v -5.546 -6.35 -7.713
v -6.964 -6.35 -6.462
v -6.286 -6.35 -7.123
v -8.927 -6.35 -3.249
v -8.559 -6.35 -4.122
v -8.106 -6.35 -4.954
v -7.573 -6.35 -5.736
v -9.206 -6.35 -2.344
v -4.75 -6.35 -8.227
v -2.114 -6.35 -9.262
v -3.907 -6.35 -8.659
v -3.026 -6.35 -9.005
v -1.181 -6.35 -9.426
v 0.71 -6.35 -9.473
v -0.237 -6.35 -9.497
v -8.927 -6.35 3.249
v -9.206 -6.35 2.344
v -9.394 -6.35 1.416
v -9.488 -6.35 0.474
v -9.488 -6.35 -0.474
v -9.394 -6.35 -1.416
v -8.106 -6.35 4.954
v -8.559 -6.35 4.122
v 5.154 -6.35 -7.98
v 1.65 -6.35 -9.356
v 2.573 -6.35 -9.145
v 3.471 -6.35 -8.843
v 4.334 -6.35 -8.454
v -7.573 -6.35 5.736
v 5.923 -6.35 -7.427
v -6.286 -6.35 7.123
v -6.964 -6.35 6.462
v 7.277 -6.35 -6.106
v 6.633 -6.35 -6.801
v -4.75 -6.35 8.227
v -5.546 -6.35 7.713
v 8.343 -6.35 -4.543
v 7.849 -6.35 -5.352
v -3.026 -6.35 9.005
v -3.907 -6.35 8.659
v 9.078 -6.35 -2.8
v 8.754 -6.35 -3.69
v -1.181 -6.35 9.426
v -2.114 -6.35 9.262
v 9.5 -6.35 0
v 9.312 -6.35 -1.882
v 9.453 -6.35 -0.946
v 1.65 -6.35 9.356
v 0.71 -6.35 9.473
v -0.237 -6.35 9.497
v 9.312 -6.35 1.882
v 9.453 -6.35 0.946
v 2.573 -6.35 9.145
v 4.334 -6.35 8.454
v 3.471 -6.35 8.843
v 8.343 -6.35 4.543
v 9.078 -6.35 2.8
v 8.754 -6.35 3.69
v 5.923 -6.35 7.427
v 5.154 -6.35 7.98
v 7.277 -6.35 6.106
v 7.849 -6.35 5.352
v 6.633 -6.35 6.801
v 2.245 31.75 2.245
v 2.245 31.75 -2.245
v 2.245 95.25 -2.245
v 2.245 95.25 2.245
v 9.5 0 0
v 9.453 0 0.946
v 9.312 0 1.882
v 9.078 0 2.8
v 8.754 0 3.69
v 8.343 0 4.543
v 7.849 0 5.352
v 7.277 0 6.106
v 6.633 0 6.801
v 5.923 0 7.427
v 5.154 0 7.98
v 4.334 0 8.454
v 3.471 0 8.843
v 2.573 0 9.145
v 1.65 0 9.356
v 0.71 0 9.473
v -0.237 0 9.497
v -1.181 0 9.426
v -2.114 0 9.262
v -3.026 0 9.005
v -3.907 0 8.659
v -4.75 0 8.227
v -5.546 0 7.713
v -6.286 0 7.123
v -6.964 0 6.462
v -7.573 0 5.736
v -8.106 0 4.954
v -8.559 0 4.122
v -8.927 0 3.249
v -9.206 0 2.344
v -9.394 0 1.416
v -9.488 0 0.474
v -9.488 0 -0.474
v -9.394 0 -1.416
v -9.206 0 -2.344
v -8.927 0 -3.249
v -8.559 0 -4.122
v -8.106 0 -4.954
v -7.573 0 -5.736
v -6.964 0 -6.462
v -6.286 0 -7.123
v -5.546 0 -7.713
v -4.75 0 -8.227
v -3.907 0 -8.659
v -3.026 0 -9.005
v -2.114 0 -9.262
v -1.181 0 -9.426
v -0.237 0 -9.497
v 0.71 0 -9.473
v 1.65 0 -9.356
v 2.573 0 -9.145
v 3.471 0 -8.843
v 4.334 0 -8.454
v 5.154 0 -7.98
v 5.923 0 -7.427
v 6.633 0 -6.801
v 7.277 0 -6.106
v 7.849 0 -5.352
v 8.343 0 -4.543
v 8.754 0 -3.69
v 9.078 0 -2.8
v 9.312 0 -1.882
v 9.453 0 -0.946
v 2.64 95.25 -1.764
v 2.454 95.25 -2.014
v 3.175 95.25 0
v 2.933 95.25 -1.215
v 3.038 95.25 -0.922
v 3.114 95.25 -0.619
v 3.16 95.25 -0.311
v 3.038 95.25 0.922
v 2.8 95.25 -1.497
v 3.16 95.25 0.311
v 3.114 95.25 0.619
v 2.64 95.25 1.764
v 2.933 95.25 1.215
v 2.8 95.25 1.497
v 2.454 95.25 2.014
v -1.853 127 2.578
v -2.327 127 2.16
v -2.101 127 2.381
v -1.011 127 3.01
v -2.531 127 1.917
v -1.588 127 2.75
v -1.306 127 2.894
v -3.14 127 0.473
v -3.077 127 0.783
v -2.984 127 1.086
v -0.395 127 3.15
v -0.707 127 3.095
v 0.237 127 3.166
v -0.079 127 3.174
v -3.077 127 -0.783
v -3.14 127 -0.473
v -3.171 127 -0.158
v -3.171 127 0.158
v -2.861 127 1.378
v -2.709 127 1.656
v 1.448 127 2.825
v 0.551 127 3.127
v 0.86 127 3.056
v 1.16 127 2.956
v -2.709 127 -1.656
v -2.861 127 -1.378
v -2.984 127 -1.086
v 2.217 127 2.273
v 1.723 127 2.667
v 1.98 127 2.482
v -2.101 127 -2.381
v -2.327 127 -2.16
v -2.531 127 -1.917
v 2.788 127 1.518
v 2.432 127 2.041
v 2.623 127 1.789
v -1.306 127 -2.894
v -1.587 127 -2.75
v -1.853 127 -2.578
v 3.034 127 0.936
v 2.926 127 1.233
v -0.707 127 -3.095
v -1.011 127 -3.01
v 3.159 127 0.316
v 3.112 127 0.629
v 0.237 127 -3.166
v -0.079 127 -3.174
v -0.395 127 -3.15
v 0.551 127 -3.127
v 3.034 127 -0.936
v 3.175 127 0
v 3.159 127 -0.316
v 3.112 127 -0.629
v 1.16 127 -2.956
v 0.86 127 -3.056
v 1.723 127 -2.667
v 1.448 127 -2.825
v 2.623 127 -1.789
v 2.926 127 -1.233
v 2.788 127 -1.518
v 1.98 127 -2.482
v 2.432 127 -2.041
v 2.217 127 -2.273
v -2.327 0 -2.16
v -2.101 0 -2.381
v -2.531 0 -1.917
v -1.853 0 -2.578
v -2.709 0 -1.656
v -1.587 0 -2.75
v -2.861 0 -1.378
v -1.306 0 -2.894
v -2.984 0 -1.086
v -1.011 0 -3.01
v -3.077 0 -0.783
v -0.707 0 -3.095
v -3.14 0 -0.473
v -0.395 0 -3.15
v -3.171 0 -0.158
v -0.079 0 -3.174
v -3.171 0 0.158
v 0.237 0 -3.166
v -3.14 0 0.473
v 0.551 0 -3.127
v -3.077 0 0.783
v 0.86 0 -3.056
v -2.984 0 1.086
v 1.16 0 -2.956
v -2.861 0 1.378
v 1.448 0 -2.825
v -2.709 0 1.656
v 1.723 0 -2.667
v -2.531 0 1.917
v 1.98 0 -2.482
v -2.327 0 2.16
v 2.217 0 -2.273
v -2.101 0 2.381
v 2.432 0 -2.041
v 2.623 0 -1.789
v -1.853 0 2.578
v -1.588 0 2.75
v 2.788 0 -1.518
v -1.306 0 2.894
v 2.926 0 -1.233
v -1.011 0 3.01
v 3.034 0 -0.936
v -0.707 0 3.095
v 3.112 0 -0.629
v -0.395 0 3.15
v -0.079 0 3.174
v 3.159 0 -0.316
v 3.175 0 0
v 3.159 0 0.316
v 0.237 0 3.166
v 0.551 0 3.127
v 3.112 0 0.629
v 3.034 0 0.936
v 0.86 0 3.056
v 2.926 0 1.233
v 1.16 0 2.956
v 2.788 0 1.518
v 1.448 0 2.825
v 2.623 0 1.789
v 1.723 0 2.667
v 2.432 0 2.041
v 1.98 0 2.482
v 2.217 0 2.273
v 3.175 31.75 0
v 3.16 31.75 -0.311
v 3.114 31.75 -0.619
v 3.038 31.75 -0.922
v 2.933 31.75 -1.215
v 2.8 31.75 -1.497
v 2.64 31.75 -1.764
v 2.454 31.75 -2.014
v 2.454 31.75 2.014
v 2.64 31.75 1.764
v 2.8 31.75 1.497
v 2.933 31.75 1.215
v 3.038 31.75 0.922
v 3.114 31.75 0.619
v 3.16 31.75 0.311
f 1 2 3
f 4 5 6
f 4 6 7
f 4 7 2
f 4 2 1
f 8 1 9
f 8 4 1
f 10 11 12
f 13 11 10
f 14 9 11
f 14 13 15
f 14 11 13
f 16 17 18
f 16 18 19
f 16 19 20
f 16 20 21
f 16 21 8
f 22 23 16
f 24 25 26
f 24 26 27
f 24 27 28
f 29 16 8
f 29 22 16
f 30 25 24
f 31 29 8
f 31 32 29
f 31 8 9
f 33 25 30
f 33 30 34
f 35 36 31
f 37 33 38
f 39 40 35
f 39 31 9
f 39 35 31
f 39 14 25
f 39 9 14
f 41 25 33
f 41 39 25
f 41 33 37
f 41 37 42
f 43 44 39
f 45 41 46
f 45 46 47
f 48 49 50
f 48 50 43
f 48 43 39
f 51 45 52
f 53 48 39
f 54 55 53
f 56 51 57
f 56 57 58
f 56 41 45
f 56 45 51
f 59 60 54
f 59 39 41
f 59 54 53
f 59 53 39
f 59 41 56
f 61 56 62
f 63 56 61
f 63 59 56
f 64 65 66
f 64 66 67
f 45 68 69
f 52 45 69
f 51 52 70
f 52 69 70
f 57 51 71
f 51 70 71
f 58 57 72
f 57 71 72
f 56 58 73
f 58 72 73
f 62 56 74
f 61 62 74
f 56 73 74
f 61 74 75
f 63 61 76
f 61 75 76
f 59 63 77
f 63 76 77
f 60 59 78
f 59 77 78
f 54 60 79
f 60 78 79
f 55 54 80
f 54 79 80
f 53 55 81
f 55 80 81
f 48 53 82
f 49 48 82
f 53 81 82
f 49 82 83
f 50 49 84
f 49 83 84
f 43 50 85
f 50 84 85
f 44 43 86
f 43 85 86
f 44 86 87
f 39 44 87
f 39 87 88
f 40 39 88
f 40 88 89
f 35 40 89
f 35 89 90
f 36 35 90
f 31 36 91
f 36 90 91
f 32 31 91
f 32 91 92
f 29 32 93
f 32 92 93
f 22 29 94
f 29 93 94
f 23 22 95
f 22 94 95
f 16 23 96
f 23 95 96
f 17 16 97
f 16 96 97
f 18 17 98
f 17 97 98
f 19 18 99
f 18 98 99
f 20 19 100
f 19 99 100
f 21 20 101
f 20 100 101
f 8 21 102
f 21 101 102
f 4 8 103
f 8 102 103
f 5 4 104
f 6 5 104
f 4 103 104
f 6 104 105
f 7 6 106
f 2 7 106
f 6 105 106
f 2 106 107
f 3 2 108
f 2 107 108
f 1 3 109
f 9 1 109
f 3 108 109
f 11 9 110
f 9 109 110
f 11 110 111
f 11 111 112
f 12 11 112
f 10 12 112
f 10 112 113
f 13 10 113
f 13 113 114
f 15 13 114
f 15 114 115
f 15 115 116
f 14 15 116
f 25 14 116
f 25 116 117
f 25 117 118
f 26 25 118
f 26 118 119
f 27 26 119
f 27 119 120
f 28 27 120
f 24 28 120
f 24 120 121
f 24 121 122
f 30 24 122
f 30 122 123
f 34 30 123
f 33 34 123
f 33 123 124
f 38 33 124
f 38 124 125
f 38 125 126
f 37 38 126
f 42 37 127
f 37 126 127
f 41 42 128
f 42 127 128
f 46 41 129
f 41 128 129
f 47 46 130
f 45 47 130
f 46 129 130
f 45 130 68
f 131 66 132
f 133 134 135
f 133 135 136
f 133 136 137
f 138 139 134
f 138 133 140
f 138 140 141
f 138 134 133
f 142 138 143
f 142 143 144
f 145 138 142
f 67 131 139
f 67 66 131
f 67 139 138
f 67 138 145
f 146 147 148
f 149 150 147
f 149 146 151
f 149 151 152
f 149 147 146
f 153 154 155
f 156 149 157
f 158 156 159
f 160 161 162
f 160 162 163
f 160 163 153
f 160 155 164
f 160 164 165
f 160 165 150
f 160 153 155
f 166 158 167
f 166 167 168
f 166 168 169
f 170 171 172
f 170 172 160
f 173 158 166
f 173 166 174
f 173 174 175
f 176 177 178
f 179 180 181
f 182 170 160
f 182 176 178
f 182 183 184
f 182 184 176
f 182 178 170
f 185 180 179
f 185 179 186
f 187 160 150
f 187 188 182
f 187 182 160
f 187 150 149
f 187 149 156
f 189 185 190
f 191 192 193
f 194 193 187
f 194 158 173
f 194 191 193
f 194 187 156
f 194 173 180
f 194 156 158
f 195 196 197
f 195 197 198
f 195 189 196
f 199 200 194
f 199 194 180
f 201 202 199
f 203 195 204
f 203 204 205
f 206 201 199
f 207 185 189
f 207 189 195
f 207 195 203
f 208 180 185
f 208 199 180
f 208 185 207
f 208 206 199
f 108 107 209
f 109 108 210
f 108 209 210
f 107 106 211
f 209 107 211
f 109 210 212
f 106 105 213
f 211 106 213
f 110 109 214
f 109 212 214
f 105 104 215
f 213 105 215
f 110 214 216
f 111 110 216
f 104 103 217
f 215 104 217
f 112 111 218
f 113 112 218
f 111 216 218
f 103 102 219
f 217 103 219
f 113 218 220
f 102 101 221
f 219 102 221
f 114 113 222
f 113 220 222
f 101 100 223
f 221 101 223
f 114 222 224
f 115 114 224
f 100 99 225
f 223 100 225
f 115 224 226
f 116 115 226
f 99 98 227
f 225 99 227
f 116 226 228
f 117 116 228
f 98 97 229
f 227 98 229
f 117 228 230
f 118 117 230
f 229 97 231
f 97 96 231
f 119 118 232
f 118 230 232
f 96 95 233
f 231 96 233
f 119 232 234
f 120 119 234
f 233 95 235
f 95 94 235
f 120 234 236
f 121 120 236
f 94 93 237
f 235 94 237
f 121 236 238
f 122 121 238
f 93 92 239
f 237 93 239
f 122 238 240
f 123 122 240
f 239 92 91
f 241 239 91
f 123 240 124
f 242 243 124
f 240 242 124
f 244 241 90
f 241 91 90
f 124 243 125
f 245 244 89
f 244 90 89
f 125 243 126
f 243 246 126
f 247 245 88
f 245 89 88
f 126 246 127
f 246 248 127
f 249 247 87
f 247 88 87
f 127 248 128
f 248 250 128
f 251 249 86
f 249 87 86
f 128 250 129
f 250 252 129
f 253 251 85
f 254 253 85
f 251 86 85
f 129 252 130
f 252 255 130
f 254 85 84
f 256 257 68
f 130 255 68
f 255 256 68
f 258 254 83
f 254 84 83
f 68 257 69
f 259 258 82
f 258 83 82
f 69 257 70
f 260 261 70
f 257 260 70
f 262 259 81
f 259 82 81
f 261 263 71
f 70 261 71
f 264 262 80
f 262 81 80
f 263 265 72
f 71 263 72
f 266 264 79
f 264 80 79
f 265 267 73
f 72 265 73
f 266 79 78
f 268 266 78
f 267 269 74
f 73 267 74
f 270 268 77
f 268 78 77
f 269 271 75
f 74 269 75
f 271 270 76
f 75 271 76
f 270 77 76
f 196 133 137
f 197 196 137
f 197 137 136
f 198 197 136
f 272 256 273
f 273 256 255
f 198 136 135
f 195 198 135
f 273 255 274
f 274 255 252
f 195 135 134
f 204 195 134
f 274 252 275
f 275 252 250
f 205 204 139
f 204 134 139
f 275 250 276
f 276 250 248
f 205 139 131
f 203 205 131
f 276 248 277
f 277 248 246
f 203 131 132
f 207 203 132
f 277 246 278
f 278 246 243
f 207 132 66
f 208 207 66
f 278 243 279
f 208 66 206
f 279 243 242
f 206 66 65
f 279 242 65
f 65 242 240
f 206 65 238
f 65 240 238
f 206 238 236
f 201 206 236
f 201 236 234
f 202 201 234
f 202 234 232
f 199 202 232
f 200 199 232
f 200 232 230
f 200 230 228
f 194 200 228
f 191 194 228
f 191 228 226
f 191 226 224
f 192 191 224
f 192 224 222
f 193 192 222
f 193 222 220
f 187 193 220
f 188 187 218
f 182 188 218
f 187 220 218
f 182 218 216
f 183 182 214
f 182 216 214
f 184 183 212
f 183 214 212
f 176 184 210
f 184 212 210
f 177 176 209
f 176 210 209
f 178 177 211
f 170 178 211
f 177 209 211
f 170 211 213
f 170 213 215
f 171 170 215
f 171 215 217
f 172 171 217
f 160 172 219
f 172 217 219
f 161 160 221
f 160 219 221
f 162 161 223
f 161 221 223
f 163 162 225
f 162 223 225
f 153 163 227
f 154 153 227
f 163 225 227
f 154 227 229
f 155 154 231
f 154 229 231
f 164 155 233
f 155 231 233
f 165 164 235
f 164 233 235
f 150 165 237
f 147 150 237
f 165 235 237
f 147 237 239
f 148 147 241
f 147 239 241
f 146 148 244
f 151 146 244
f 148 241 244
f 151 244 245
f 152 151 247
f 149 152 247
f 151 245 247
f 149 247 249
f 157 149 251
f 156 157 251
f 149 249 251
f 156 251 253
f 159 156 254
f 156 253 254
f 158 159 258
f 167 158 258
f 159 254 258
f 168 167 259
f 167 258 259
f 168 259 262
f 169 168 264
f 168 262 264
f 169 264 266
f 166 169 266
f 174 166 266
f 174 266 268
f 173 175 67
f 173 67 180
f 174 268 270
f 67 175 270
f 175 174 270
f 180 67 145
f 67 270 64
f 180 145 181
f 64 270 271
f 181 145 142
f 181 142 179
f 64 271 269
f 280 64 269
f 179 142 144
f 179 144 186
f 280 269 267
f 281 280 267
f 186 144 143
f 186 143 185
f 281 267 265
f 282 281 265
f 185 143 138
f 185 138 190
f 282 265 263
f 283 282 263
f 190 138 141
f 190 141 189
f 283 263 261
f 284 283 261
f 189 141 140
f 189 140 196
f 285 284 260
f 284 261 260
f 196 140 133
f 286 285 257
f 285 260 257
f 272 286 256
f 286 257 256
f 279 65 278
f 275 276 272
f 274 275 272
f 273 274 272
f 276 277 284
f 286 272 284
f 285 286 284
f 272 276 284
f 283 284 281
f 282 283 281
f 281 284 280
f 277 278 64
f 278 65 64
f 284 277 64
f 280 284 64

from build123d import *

# Parameters (mm, degrees)
SKETCH1_R           = 3.175
BOSS_EXTRUDE1_DEPTH = 127
CUT_EXTRUDE1_START  = -31.75
SKETCH2_W           = 1.117822334
SKETCH2_H           = 4.49012806
CUT_EXTRUDE1_DEPTH  = 63.5
SKETCH3_R           = 9.5
BOSS_EXTRUDE2_DEPTH = 6.35


with BuildPart() as part:
    # Sketch1 → Boss-Extrude1 (new body)
    with BuildSketch(Plane(origin=(0, 0, 0), x_dir=(1, 0, 0), z_dir=(0, 1, 0))):
        Circle(SKETCH1_R)
    extrude(amount=BOSS_EXTRUDE1_DEPTH)

    # Sketch2 → Cut-Extrude1 (cut)
    with BuildSketch(Plane.XZ.offset(CUT_EXTRUDE1_START)):
        with Locations((2.803975197, 0)):
            Rectangle(SKETCH2_W, SKETCH2_H)
    extrude(amount=-CUT_EXTRUDE1_DEPTH, mode=Mode.SUBTRACT)

    # Sketch3 → Boss-Extrude2 (add)
    with BuildSketch(Plane.XZ):
        Circle(SKETCH3_R)
    extrude(amount=BOSS_EXTRUDE2_DEPTH)


solid = part.part
